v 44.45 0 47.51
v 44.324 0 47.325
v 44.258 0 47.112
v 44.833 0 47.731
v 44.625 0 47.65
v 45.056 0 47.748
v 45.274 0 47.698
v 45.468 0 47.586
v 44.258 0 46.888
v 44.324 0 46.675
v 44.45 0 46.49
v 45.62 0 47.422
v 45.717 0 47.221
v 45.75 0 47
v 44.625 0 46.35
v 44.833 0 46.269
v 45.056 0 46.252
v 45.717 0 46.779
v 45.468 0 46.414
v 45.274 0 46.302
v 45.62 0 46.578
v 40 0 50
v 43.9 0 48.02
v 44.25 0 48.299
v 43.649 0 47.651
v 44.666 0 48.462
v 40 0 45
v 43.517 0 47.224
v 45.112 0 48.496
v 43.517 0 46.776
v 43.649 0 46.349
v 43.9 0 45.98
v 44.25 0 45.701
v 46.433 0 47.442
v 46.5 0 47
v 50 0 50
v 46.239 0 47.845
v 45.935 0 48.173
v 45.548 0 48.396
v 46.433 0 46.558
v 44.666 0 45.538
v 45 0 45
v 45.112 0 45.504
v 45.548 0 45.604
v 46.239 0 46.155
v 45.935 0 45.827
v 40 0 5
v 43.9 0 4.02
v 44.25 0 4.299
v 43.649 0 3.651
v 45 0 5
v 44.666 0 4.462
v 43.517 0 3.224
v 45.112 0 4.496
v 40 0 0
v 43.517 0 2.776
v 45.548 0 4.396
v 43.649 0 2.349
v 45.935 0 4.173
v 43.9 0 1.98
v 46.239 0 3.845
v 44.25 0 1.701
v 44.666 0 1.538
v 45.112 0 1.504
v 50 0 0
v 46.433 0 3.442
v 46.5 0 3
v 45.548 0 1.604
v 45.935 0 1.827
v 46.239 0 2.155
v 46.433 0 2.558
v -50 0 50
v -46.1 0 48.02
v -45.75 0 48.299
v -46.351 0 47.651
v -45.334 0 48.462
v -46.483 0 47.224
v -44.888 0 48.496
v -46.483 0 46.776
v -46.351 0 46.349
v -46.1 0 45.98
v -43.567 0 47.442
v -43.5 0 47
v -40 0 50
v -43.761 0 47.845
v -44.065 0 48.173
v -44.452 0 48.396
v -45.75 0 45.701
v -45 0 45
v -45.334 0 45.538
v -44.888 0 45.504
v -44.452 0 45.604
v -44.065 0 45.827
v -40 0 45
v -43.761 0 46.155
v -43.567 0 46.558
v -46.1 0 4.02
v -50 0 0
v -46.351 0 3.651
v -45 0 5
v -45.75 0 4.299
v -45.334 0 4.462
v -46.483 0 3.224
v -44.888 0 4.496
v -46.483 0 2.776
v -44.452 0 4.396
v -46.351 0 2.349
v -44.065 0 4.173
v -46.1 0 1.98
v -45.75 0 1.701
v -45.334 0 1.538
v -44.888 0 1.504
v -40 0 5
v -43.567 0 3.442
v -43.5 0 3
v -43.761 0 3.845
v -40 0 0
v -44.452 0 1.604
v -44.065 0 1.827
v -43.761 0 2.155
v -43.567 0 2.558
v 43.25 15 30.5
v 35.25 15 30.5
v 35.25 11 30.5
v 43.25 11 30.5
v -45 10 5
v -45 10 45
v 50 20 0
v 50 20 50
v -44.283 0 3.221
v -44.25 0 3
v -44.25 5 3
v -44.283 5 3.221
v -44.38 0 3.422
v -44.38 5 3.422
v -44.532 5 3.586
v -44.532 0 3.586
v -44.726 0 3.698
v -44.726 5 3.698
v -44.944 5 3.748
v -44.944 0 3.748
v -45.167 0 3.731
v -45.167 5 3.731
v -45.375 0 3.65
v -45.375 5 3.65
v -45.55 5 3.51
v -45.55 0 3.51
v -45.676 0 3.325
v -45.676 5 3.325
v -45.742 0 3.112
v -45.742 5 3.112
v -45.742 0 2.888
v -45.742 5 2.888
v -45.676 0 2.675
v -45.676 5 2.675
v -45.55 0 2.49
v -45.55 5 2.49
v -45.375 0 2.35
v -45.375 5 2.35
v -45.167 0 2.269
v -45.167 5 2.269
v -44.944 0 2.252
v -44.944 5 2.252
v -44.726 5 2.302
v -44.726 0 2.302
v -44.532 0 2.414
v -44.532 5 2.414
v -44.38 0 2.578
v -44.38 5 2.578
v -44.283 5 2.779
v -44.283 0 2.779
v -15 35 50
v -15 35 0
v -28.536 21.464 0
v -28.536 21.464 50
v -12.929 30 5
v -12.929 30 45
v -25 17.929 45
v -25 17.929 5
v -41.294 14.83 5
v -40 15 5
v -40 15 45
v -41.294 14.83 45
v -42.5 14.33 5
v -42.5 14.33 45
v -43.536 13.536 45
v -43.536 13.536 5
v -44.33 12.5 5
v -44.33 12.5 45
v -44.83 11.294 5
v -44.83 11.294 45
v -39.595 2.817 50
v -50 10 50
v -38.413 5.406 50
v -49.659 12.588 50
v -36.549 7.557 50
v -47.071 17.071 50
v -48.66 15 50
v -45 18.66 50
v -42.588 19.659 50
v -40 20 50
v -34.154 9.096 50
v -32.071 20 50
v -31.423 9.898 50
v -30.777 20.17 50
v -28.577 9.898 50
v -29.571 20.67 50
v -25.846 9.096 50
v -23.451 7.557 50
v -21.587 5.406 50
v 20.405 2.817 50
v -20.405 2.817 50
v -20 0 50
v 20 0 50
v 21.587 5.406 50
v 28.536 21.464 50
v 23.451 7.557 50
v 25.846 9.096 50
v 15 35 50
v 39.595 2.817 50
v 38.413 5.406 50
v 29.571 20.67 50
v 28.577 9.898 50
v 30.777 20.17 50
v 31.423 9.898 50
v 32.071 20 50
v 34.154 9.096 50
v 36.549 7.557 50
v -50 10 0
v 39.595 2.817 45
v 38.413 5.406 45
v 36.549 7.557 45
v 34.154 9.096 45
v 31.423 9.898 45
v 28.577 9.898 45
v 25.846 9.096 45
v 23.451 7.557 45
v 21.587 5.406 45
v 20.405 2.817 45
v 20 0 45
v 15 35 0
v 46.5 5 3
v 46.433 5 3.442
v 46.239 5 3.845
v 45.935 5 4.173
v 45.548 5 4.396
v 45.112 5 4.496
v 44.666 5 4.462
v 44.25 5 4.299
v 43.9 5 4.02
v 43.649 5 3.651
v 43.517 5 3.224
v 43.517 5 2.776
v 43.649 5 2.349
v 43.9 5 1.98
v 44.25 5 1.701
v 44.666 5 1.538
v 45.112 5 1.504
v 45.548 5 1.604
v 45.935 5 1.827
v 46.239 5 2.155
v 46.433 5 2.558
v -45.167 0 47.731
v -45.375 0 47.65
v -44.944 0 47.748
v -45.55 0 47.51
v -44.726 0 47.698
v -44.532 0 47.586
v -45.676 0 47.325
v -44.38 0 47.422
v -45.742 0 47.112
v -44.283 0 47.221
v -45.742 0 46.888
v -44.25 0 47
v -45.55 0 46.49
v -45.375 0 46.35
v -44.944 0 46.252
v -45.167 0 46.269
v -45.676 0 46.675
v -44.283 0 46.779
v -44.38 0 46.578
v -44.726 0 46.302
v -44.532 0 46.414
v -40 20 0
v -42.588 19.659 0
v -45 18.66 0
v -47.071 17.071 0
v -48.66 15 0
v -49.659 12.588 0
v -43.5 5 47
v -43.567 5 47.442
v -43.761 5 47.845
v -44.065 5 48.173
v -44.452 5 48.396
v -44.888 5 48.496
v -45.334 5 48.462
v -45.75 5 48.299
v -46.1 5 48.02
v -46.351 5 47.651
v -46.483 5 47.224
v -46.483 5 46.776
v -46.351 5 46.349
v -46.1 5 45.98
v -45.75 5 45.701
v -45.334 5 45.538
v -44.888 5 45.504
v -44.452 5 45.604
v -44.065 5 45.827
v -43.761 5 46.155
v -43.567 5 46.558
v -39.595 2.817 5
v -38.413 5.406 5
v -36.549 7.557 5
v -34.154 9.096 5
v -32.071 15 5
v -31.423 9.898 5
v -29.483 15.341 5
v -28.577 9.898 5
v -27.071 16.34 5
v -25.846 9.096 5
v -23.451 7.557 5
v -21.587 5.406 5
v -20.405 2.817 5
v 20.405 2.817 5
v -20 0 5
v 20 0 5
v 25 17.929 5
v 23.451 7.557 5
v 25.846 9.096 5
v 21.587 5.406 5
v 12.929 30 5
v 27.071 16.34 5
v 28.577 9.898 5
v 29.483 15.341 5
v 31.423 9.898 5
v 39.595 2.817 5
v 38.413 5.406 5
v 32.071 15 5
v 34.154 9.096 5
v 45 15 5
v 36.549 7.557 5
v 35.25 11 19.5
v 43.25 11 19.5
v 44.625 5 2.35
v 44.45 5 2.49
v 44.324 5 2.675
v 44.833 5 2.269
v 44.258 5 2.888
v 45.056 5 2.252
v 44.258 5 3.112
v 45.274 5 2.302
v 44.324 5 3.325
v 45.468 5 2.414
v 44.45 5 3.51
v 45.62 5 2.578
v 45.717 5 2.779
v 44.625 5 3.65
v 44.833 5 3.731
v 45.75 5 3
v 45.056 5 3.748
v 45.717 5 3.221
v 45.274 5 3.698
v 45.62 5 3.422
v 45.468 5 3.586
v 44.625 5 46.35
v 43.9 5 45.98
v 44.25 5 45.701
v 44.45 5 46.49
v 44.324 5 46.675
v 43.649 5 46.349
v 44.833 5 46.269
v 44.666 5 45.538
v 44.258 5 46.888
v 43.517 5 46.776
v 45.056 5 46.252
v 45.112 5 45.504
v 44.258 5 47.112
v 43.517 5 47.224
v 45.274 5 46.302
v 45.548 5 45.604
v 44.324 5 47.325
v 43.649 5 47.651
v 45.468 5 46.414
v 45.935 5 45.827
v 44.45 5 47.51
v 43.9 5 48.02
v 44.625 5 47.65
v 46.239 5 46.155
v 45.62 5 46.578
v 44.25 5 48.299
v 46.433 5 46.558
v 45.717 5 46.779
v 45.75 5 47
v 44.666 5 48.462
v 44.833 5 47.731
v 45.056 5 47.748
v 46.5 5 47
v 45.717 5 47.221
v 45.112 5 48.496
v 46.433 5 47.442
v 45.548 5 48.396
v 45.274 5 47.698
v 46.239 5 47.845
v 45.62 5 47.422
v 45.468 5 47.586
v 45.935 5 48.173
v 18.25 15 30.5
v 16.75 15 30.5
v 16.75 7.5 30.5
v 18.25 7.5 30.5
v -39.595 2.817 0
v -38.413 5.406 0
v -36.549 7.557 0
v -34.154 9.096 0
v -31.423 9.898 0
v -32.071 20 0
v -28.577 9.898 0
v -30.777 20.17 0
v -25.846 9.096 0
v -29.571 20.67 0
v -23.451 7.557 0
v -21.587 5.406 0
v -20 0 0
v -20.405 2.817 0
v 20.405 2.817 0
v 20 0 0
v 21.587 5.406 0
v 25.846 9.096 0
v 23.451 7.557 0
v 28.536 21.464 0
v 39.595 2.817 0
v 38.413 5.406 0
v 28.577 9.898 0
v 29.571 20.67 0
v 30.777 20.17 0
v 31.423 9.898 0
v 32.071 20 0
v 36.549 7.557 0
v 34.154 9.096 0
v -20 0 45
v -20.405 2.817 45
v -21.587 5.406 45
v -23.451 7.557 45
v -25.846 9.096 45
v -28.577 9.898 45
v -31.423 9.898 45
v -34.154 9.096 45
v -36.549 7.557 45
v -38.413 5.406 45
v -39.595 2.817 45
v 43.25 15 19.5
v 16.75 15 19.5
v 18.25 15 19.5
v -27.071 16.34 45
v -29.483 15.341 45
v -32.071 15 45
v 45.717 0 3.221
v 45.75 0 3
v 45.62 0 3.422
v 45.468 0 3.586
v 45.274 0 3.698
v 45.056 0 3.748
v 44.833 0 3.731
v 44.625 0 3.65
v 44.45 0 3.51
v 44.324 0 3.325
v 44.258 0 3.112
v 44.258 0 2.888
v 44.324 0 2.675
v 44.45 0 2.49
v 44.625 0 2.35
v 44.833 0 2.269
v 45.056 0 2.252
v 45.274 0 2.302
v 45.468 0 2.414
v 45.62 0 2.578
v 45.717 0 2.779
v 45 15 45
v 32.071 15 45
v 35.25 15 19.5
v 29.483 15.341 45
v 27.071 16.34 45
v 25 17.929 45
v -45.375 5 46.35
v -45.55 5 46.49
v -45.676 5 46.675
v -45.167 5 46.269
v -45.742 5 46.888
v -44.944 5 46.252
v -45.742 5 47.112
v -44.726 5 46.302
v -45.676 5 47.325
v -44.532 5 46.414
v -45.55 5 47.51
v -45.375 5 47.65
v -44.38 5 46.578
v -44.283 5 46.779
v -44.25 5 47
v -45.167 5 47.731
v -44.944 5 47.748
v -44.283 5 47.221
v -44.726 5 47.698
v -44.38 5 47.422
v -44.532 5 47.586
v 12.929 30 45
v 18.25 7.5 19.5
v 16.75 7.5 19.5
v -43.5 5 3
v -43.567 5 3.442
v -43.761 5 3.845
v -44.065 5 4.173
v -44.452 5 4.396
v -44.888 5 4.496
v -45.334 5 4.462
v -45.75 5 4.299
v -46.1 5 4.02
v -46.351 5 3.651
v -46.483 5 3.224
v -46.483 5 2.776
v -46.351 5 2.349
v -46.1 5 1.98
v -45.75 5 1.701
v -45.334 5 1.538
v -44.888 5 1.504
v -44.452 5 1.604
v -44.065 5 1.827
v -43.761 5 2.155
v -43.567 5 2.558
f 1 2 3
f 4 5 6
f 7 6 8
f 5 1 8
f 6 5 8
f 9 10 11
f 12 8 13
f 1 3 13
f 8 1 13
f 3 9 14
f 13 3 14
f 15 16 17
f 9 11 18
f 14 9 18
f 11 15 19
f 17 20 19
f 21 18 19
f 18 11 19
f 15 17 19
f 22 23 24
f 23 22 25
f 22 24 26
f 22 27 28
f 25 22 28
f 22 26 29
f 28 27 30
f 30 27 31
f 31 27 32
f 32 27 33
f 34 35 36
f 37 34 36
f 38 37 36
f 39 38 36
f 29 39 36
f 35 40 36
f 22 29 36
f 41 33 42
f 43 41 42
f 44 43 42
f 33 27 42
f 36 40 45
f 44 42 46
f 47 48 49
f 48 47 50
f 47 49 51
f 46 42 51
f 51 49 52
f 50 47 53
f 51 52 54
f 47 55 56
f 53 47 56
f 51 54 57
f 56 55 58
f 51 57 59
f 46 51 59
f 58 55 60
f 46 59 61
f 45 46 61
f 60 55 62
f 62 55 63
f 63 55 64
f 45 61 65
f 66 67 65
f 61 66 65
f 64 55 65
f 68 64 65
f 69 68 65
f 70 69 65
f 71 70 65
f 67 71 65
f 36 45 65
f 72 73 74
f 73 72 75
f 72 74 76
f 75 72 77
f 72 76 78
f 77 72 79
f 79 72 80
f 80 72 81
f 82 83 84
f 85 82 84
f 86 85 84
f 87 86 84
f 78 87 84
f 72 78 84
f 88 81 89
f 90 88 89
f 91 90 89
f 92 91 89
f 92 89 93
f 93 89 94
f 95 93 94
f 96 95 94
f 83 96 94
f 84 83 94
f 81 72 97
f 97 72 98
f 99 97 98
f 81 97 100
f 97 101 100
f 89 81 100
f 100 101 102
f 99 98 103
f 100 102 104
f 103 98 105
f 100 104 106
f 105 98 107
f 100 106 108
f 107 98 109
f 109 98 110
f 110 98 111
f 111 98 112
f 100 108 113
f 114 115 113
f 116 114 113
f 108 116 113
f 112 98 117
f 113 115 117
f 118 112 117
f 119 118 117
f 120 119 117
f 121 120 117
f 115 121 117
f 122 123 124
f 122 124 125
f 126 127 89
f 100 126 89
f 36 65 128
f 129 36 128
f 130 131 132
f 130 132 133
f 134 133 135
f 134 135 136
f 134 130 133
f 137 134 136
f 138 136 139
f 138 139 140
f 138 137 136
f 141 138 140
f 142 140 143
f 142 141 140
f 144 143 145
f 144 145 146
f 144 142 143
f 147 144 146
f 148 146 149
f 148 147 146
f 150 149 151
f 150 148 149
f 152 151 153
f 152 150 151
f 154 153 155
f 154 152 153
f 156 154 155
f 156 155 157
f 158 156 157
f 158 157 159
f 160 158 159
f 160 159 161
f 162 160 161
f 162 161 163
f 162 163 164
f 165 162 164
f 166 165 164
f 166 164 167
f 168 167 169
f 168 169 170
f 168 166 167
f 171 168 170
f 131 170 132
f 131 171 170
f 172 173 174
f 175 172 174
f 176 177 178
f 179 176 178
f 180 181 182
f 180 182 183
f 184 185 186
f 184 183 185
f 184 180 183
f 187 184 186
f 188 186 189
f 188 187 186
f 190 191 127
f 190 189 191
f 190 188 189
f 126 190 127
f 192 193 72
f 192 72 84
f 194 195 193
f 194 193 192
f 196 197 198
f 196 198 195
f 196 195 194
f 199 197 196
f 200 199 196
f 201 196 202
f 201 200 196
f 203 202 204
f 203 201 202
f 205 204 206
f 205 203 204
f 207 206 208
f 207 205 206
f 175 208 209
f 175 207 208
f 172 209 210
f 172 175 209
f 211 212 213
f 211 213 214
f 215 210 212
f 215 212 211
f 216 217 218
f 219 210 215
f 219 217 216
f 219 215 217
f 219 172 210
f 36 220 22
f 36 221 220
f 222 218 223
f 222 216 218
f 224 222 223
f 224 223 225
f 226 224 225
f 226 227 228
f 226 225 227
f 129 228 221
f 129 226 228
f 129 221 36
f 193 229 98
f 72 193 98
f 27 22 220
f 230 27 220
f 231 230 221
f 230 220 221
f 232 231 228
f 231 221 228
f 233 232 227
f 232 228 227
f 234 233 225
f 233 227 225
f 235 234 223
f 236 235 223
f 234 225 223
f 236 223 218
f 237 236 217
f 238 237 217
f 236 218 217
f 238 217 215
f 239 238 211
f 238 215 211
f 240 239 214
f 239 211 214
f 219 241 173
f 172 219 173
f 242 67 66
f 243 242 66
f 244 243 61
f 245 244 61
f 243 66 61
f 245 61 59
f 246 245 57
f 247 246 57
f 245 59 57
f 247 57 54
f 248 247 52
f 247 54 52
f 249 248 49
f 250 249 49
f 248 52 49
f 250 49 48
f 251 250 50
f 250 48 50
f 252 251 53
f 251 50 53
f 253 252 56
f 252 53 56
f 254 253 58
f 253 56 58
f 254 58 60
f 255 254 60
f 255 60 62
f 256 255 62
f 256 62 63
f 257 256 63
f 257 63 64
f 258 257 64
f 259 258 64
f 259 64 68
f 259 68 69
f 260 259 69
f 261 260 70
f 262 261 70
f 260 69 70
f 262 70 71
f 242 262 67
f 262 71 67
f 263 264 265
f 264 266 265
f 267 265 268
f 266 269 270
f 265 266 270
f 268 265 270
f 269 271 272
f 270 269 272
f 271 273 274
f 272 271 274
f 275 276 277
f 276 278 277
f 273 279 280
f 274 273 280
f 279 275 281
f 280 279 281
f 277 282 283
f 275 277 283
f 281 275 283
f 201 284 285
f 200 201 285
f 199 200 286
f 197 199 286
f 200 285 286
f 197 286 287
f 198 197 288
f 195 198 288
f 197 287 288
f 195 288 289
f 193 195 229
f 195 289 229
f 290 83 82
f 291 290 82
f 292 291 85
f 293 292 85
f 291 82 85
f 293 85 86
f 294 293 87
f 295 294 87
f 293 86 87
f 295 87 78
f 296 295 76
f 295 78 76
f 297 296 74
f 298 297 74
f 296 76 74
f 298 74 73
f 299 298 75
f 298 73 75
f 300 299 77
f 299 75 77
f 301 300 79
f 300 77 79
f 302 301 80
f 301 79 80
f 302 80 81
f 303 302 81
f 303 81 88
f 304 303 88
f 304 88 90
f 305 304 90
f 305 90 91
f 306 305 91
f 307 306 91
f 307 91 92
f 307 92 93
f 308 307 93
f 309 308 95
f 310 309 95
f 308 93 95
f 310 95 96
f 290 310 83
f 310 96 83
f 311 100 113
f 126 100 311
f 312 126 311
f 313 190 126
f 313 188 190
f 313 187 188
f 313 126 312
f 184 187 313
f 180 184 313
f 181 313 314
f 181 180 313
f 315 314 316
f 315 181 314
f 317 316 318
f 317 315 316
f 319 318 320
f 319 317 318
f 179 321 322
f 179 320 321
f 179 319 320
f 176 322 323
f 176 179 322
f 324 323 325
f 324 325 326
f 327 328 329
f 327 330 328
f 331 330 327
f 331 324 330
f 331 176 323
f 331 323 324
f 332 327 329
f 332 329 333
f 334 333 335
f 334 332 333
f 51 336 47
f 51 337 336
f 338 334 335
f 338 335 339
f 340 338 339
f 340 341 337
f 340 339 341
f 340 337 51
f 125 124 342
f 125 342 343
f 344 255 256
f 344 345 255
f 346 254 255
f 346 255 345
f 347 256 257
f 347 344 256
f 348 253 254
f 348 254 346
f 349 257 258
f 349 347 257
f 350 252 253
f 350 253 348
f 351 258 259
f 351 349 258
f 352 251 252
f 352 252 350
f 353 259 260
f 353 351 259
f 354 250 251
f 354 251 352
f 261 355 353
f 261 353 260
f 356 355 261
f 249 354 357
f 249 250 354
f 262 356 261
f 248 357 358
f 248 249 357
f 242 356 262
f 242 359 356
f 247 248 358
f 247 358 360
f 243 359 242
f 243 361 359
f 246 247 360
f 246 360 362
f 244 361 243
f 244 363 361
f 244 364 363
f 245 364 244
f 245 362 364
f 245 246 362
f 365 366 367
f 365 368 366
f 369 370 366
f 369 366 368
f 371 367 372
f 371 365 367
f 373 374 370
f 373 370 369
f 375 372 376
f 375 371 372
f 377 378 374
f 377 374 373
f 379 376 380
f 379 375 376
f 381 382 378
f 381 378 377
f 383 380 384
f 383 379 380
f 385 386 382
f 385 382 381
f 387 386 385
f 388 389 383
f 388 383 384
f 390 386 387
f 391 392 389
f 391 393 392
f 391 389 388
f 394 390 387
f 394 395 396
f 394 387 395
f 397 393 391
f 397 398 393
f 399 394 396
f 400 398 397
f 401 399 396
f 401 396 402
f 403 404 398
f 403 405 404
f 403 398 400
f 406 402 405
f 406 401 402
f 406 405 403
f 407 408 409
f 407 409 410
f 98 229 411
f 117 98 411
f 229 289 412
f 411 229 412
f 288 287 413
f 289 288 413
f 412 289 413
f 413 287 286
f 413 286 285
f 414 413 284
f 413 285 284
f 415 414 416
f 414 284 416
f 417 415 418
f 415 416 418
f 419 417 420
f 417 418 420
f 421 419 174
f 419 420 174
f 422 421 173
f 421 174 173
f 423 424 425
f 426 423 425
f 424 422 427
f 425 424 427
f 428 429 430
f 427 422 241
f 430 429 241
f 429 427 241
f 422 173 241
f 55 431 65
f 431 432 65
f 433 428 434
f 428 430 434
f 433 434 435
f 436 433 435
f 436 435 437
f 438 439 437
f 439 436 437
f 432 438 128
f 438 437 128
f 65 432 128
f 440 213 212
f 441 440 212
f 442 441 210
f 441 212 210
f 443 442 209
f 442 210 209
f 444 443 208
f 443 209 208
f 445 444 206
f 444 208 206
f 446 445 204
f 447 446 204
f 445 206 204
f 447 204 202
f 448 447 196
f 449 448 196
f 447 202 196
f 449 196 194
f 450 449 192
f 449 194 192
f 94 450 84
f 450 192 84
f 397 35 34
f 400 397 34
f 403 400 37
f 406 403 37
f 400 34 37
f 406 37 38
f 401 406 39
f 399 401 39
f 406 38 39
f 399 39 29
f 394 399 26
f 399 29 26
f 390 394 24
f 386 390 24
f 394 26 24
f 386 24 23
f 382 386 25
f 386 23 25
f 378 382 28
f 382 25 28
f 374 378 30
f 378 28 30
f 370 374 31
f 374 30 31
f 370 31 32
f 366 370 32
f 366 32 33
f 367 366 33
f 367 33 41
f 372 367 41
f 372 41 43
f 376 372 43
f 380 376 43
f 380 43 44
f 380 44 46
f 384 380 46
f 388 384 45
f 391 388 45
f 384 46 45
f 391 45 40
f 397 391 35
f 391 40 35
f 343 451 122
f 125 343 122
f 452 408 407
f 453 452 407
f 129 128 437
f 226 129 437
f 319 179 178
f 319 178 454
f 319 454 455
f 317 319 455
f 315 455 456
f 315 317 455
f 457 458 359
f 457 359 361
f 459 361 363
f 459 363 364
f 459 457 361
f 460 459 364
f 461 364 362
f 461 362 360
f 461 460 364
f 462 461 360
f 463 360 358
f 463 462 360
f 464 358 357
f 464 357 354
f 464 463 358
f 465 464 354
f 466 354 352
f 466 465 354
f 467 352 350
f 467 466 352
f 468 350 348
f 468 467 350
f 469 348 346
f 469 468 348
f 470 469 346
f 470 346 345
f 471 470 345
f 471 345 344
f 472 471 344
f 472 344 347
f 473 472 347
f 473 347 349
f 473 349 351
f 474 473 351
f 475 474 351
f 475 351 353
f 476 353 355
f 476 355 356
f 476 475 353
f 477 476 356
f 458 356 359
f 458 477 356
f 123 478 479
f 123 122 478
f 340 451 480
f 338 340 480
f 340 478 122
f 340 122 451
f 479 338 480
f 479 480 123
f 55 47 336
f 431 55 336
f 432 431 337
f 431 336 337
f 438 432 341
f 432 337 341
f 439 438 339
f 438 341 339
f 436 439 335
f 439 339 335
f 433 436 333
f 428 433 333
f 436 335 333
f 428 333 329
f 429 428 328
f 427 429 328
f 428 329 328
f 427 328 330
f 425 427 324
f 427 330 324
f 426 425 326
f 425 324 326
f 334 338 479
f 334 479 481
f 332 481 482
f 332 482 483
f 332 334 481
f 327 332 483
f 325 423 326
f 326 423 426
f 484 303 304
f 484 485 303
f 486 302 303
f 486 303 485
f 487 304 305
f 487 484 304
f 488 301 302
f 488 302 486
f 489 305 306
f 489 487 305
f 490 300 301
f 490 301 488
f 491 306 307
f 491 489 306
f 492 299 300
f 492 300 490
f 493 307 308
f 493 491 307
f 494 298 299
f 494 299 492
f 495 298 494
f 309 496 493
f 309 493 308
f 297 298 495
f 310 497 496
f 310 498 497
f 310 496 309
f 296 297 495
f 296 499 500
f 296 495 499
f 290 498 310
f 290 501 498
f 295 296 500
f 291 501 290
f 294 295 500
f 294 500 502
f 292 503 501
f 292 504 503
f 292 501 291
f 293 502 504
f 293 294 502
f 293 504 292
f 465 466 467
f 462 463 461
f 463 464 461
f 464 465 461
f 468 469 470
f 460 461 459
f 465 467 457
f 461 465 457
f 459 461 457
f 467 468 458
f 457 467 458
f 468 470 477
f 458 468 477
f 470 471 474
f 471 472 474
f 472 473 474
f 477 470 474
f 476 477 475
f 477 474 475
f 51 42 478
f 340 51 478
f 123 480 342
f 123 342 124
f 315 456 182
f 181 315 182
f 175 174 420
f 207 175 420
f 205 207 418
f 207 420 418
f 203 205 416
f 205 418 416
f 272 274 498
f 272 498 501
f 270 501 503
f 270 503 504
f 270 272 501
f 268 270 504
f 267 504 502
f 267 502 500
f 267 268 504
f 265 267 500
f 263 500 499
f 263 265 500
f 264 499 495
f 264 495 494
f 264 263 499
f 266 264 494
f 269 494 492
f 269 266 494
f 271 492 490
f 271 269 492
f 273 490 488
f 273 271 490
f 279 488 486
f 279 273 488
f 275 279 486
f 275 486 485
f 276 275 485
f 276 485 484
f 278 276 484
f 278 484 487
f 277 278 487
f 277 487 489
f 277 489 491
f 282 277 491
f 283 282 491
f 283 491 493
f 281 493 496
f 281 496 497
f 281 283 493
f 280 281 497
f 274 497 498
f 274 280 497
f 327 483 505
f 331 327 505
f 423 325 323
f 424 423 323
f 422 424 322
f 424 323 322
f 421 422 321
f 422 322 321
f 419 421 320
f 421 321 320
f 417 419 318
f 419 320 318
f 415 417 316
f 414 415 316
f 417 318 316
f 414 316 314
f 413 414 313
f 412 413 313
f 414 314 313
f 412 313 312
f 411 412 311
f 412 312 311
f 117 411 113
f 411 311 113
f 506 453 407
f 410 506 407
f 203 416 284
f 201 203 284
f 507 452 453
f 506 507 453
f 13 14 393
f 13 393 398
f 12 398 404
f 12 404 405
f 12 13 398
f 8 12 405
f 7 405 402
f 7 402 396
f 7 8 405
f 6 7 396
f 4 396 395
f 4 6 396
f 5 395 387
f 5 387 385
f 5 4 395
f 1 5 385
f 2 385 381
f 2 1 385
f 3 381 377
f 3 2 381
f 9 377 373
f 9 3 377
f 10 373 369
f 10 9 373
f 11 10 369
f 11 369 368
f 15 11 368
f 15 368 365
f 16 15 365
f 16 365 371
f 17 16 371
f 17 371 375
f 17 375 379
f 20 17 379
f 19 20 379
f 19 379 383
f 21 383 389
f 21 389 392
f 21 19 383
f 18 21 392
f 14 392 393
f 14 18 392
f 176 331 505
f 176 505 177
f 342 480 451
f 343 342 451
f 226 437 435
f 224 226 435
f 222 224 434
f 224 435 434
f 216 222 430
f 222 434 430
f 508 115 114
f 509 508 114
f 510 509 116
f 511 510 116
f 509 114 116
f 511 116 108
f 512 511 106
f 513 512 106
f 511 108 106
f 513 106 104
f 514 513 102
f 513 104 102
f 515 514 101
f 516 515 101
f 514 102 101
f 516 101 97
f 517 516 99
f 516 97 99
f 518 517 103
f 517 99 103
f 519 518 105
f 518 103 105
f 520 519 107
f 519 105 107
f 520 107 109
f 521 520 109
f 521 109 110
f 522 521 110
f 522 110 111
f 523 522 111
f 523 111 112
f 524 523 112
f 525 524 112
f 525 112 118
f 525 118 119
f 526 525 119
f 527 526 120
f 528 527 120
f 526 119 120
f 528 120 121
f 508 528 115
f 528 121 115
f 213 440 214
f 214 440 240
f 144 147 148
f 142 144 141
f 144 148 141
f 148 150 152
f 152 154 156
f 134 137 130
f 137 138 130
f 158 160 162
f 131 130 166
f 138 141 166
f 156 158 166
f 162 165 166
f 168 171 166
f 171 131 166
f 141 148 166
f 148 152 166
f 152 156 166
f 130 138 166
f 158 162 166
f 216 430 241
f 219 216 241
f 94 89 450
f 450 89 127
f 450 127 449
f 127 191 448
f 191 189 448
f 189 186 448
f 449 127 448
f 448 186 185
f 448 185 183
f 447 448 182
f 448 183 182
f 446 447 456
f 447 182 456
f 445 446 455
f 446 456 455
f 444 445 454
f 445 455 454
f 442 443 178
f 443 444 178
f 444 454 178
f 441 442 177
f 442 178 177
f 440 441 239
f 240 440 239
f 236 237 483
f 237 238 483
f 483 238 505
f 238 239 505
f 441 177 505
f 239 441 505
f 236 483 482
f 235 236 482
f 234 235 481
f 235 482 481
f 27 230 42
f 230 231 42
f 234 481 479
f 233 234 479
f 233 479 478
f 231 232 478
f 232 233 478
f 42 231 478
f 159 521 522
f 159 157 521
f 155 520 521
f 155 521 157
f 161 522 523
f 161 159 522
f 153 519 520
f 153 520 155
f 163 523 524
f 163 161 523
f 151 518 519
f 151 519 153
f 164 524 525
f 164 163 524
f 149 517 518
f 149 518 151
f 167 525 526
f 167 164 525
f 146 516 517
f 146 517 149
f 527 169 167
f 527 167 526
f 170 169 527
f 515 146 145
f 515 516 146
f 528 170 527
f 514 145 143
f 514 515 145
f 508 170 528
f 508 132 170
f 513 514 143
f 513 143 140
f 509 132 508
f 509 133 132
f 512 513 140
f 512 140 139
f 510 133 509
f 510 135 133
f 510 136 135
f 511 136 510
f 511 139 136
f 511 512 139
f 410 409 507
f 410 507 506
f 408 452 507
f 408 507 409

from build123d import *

# Parameters (mm, degrees)
BOSS_EXTRUDE1_DEPTH = 50
SHELL1_T            = -5
CUT_EXTRUDE1_DEPTH  = 51
SKETCH5_R           = 1.5
SKETCH5_R_2         = 0.75
CUT_EXTRUDE3_DEPTH  = 5
SKETCH6_W           = 1.5
SKETCH6_H           = 11
SKETCH6_W_2         = 8
BOSS_EXTRUDE2_DEPTH = 7.5
SKETCH8_W           = 8
SKETCH8_H           = 11
CUT_EXTRUDE5_DEPTH  = 3.5


with BuildPart() as part:
    # Sketch1 → Boss-Extrude1 (new body)
    with BuildSketch(Plane.XY):
        with BuildLine():
            Line((-50, 0), (50, 0))
            Line((50, 0), (50, 20))
            Line((50, 20), (32.071067812, 20))
            ThreePointArc((32.071067812, 20), (30.15765065, 20.380602337), (28.535533906, 21.464466094))
            Line((28.535533906, 21.464466094), (15, 35))
            Line((15, 35), (-15, 35))
            Line((-15, 35), (-28.535533906, 21.464466094))
            ThreePointArc((-28.535533906, 21.464466094), (-30.15765065, 20.380602337), (-32.071067812, 20))
            Line((-32.071067812, 20), (-40, 20))
            ThreePointArc((-40, 20), (-47.071067812, 17.071067812), (-50, 10))
            Line((-50, 10), (-50, 0))
        make_face()
    extrude(amount=BOSS_EXTRUDE1_DEPTH)

    # Shell1
    shell1_openings = [part.faces().sort_by_distance(p)[0] for p in [
        (0, 0, 25),
    ]]
    offset(amount=SHELL1_T, openings=shell1_openings, kind=Kind.INTERSECTION)

    # Sketch2 → Cut-Extrude1 (cut, through all)
    with BuildSketch(Plane.XY.offset(50)):
        with BuildLine():
            Line((-40, 0), (-20, 0))
            ThreePointArc((-20, 0), (-30, 10), (-40, 0))
        make_face()
        with BuildLine():
            Line((20, 0), (40, 0))
            ThreePointArc((40, 0), (30, 10), (20, 0))
        make_face()
    extrude(amount=-CUT_EXTRUDE1_DEPTH, mode=Mode.SUBTRACT)

    # Sketch5 → Cut-Extrude3 (cut)
    with BuildSketch(Plane.XZ):
        with Locations((-45, 3)):
            Circle(SKETCH5_R)
        with Locations((-45, 3)):
            Circle(SKETCH5_R_2, mode=Mode.SUBTRACT)
        with Locations((45, 3)):
            Circle(SKETCH5_R)
        with Locations((45, 3)):
            Circle(SKETCH5_R_2, mode=Mode.SUBTRACT)
        with Locations((45, 47)):
            Circle(SKETCH5_R)
        with Locations((45, 47)):
            Circle(SKETCH5_R_2, mode=Mode.SUBTRACT)
        with Locations((-45, 47)):
            Circle(SKETCH5_R)
        with Locations((-45, 47)):
            Circle(SKETCH5_R_2, mode=Mode.SUBTRACT)
    extrude(amount=-CUT_EXTRUDE3_DEPTH, mode=Mode.SUBTRACT)

    # Sketch6 → Boss-Extrude2 (add)
    with BuildSketch(Plane.XZ.offset(-15)):
        with Locations((17.5, 25)):
            Rectangle(SKETCH6_W, SKETCH6_H)
        with Locations((39.25, 25)):
            Rectangle(SKETCH6_W_2, SKETCH6_H)
    extrude(amount=BOSS_EXTRUDE2_DEPTH)

    # Sketch8 → Cut-Extrude5 (cut)
    with BuildSketch(Plane.XZ.offset(-7.5)):
        with Locations((39.25, 25)):
            Rectangle(SKETCH8_W, SKETCH8_H)
    extrude(amount=-CUT_EXTRUDE5_DEPTH, mode=Mode.SUBTRACT)


solid = part.part
